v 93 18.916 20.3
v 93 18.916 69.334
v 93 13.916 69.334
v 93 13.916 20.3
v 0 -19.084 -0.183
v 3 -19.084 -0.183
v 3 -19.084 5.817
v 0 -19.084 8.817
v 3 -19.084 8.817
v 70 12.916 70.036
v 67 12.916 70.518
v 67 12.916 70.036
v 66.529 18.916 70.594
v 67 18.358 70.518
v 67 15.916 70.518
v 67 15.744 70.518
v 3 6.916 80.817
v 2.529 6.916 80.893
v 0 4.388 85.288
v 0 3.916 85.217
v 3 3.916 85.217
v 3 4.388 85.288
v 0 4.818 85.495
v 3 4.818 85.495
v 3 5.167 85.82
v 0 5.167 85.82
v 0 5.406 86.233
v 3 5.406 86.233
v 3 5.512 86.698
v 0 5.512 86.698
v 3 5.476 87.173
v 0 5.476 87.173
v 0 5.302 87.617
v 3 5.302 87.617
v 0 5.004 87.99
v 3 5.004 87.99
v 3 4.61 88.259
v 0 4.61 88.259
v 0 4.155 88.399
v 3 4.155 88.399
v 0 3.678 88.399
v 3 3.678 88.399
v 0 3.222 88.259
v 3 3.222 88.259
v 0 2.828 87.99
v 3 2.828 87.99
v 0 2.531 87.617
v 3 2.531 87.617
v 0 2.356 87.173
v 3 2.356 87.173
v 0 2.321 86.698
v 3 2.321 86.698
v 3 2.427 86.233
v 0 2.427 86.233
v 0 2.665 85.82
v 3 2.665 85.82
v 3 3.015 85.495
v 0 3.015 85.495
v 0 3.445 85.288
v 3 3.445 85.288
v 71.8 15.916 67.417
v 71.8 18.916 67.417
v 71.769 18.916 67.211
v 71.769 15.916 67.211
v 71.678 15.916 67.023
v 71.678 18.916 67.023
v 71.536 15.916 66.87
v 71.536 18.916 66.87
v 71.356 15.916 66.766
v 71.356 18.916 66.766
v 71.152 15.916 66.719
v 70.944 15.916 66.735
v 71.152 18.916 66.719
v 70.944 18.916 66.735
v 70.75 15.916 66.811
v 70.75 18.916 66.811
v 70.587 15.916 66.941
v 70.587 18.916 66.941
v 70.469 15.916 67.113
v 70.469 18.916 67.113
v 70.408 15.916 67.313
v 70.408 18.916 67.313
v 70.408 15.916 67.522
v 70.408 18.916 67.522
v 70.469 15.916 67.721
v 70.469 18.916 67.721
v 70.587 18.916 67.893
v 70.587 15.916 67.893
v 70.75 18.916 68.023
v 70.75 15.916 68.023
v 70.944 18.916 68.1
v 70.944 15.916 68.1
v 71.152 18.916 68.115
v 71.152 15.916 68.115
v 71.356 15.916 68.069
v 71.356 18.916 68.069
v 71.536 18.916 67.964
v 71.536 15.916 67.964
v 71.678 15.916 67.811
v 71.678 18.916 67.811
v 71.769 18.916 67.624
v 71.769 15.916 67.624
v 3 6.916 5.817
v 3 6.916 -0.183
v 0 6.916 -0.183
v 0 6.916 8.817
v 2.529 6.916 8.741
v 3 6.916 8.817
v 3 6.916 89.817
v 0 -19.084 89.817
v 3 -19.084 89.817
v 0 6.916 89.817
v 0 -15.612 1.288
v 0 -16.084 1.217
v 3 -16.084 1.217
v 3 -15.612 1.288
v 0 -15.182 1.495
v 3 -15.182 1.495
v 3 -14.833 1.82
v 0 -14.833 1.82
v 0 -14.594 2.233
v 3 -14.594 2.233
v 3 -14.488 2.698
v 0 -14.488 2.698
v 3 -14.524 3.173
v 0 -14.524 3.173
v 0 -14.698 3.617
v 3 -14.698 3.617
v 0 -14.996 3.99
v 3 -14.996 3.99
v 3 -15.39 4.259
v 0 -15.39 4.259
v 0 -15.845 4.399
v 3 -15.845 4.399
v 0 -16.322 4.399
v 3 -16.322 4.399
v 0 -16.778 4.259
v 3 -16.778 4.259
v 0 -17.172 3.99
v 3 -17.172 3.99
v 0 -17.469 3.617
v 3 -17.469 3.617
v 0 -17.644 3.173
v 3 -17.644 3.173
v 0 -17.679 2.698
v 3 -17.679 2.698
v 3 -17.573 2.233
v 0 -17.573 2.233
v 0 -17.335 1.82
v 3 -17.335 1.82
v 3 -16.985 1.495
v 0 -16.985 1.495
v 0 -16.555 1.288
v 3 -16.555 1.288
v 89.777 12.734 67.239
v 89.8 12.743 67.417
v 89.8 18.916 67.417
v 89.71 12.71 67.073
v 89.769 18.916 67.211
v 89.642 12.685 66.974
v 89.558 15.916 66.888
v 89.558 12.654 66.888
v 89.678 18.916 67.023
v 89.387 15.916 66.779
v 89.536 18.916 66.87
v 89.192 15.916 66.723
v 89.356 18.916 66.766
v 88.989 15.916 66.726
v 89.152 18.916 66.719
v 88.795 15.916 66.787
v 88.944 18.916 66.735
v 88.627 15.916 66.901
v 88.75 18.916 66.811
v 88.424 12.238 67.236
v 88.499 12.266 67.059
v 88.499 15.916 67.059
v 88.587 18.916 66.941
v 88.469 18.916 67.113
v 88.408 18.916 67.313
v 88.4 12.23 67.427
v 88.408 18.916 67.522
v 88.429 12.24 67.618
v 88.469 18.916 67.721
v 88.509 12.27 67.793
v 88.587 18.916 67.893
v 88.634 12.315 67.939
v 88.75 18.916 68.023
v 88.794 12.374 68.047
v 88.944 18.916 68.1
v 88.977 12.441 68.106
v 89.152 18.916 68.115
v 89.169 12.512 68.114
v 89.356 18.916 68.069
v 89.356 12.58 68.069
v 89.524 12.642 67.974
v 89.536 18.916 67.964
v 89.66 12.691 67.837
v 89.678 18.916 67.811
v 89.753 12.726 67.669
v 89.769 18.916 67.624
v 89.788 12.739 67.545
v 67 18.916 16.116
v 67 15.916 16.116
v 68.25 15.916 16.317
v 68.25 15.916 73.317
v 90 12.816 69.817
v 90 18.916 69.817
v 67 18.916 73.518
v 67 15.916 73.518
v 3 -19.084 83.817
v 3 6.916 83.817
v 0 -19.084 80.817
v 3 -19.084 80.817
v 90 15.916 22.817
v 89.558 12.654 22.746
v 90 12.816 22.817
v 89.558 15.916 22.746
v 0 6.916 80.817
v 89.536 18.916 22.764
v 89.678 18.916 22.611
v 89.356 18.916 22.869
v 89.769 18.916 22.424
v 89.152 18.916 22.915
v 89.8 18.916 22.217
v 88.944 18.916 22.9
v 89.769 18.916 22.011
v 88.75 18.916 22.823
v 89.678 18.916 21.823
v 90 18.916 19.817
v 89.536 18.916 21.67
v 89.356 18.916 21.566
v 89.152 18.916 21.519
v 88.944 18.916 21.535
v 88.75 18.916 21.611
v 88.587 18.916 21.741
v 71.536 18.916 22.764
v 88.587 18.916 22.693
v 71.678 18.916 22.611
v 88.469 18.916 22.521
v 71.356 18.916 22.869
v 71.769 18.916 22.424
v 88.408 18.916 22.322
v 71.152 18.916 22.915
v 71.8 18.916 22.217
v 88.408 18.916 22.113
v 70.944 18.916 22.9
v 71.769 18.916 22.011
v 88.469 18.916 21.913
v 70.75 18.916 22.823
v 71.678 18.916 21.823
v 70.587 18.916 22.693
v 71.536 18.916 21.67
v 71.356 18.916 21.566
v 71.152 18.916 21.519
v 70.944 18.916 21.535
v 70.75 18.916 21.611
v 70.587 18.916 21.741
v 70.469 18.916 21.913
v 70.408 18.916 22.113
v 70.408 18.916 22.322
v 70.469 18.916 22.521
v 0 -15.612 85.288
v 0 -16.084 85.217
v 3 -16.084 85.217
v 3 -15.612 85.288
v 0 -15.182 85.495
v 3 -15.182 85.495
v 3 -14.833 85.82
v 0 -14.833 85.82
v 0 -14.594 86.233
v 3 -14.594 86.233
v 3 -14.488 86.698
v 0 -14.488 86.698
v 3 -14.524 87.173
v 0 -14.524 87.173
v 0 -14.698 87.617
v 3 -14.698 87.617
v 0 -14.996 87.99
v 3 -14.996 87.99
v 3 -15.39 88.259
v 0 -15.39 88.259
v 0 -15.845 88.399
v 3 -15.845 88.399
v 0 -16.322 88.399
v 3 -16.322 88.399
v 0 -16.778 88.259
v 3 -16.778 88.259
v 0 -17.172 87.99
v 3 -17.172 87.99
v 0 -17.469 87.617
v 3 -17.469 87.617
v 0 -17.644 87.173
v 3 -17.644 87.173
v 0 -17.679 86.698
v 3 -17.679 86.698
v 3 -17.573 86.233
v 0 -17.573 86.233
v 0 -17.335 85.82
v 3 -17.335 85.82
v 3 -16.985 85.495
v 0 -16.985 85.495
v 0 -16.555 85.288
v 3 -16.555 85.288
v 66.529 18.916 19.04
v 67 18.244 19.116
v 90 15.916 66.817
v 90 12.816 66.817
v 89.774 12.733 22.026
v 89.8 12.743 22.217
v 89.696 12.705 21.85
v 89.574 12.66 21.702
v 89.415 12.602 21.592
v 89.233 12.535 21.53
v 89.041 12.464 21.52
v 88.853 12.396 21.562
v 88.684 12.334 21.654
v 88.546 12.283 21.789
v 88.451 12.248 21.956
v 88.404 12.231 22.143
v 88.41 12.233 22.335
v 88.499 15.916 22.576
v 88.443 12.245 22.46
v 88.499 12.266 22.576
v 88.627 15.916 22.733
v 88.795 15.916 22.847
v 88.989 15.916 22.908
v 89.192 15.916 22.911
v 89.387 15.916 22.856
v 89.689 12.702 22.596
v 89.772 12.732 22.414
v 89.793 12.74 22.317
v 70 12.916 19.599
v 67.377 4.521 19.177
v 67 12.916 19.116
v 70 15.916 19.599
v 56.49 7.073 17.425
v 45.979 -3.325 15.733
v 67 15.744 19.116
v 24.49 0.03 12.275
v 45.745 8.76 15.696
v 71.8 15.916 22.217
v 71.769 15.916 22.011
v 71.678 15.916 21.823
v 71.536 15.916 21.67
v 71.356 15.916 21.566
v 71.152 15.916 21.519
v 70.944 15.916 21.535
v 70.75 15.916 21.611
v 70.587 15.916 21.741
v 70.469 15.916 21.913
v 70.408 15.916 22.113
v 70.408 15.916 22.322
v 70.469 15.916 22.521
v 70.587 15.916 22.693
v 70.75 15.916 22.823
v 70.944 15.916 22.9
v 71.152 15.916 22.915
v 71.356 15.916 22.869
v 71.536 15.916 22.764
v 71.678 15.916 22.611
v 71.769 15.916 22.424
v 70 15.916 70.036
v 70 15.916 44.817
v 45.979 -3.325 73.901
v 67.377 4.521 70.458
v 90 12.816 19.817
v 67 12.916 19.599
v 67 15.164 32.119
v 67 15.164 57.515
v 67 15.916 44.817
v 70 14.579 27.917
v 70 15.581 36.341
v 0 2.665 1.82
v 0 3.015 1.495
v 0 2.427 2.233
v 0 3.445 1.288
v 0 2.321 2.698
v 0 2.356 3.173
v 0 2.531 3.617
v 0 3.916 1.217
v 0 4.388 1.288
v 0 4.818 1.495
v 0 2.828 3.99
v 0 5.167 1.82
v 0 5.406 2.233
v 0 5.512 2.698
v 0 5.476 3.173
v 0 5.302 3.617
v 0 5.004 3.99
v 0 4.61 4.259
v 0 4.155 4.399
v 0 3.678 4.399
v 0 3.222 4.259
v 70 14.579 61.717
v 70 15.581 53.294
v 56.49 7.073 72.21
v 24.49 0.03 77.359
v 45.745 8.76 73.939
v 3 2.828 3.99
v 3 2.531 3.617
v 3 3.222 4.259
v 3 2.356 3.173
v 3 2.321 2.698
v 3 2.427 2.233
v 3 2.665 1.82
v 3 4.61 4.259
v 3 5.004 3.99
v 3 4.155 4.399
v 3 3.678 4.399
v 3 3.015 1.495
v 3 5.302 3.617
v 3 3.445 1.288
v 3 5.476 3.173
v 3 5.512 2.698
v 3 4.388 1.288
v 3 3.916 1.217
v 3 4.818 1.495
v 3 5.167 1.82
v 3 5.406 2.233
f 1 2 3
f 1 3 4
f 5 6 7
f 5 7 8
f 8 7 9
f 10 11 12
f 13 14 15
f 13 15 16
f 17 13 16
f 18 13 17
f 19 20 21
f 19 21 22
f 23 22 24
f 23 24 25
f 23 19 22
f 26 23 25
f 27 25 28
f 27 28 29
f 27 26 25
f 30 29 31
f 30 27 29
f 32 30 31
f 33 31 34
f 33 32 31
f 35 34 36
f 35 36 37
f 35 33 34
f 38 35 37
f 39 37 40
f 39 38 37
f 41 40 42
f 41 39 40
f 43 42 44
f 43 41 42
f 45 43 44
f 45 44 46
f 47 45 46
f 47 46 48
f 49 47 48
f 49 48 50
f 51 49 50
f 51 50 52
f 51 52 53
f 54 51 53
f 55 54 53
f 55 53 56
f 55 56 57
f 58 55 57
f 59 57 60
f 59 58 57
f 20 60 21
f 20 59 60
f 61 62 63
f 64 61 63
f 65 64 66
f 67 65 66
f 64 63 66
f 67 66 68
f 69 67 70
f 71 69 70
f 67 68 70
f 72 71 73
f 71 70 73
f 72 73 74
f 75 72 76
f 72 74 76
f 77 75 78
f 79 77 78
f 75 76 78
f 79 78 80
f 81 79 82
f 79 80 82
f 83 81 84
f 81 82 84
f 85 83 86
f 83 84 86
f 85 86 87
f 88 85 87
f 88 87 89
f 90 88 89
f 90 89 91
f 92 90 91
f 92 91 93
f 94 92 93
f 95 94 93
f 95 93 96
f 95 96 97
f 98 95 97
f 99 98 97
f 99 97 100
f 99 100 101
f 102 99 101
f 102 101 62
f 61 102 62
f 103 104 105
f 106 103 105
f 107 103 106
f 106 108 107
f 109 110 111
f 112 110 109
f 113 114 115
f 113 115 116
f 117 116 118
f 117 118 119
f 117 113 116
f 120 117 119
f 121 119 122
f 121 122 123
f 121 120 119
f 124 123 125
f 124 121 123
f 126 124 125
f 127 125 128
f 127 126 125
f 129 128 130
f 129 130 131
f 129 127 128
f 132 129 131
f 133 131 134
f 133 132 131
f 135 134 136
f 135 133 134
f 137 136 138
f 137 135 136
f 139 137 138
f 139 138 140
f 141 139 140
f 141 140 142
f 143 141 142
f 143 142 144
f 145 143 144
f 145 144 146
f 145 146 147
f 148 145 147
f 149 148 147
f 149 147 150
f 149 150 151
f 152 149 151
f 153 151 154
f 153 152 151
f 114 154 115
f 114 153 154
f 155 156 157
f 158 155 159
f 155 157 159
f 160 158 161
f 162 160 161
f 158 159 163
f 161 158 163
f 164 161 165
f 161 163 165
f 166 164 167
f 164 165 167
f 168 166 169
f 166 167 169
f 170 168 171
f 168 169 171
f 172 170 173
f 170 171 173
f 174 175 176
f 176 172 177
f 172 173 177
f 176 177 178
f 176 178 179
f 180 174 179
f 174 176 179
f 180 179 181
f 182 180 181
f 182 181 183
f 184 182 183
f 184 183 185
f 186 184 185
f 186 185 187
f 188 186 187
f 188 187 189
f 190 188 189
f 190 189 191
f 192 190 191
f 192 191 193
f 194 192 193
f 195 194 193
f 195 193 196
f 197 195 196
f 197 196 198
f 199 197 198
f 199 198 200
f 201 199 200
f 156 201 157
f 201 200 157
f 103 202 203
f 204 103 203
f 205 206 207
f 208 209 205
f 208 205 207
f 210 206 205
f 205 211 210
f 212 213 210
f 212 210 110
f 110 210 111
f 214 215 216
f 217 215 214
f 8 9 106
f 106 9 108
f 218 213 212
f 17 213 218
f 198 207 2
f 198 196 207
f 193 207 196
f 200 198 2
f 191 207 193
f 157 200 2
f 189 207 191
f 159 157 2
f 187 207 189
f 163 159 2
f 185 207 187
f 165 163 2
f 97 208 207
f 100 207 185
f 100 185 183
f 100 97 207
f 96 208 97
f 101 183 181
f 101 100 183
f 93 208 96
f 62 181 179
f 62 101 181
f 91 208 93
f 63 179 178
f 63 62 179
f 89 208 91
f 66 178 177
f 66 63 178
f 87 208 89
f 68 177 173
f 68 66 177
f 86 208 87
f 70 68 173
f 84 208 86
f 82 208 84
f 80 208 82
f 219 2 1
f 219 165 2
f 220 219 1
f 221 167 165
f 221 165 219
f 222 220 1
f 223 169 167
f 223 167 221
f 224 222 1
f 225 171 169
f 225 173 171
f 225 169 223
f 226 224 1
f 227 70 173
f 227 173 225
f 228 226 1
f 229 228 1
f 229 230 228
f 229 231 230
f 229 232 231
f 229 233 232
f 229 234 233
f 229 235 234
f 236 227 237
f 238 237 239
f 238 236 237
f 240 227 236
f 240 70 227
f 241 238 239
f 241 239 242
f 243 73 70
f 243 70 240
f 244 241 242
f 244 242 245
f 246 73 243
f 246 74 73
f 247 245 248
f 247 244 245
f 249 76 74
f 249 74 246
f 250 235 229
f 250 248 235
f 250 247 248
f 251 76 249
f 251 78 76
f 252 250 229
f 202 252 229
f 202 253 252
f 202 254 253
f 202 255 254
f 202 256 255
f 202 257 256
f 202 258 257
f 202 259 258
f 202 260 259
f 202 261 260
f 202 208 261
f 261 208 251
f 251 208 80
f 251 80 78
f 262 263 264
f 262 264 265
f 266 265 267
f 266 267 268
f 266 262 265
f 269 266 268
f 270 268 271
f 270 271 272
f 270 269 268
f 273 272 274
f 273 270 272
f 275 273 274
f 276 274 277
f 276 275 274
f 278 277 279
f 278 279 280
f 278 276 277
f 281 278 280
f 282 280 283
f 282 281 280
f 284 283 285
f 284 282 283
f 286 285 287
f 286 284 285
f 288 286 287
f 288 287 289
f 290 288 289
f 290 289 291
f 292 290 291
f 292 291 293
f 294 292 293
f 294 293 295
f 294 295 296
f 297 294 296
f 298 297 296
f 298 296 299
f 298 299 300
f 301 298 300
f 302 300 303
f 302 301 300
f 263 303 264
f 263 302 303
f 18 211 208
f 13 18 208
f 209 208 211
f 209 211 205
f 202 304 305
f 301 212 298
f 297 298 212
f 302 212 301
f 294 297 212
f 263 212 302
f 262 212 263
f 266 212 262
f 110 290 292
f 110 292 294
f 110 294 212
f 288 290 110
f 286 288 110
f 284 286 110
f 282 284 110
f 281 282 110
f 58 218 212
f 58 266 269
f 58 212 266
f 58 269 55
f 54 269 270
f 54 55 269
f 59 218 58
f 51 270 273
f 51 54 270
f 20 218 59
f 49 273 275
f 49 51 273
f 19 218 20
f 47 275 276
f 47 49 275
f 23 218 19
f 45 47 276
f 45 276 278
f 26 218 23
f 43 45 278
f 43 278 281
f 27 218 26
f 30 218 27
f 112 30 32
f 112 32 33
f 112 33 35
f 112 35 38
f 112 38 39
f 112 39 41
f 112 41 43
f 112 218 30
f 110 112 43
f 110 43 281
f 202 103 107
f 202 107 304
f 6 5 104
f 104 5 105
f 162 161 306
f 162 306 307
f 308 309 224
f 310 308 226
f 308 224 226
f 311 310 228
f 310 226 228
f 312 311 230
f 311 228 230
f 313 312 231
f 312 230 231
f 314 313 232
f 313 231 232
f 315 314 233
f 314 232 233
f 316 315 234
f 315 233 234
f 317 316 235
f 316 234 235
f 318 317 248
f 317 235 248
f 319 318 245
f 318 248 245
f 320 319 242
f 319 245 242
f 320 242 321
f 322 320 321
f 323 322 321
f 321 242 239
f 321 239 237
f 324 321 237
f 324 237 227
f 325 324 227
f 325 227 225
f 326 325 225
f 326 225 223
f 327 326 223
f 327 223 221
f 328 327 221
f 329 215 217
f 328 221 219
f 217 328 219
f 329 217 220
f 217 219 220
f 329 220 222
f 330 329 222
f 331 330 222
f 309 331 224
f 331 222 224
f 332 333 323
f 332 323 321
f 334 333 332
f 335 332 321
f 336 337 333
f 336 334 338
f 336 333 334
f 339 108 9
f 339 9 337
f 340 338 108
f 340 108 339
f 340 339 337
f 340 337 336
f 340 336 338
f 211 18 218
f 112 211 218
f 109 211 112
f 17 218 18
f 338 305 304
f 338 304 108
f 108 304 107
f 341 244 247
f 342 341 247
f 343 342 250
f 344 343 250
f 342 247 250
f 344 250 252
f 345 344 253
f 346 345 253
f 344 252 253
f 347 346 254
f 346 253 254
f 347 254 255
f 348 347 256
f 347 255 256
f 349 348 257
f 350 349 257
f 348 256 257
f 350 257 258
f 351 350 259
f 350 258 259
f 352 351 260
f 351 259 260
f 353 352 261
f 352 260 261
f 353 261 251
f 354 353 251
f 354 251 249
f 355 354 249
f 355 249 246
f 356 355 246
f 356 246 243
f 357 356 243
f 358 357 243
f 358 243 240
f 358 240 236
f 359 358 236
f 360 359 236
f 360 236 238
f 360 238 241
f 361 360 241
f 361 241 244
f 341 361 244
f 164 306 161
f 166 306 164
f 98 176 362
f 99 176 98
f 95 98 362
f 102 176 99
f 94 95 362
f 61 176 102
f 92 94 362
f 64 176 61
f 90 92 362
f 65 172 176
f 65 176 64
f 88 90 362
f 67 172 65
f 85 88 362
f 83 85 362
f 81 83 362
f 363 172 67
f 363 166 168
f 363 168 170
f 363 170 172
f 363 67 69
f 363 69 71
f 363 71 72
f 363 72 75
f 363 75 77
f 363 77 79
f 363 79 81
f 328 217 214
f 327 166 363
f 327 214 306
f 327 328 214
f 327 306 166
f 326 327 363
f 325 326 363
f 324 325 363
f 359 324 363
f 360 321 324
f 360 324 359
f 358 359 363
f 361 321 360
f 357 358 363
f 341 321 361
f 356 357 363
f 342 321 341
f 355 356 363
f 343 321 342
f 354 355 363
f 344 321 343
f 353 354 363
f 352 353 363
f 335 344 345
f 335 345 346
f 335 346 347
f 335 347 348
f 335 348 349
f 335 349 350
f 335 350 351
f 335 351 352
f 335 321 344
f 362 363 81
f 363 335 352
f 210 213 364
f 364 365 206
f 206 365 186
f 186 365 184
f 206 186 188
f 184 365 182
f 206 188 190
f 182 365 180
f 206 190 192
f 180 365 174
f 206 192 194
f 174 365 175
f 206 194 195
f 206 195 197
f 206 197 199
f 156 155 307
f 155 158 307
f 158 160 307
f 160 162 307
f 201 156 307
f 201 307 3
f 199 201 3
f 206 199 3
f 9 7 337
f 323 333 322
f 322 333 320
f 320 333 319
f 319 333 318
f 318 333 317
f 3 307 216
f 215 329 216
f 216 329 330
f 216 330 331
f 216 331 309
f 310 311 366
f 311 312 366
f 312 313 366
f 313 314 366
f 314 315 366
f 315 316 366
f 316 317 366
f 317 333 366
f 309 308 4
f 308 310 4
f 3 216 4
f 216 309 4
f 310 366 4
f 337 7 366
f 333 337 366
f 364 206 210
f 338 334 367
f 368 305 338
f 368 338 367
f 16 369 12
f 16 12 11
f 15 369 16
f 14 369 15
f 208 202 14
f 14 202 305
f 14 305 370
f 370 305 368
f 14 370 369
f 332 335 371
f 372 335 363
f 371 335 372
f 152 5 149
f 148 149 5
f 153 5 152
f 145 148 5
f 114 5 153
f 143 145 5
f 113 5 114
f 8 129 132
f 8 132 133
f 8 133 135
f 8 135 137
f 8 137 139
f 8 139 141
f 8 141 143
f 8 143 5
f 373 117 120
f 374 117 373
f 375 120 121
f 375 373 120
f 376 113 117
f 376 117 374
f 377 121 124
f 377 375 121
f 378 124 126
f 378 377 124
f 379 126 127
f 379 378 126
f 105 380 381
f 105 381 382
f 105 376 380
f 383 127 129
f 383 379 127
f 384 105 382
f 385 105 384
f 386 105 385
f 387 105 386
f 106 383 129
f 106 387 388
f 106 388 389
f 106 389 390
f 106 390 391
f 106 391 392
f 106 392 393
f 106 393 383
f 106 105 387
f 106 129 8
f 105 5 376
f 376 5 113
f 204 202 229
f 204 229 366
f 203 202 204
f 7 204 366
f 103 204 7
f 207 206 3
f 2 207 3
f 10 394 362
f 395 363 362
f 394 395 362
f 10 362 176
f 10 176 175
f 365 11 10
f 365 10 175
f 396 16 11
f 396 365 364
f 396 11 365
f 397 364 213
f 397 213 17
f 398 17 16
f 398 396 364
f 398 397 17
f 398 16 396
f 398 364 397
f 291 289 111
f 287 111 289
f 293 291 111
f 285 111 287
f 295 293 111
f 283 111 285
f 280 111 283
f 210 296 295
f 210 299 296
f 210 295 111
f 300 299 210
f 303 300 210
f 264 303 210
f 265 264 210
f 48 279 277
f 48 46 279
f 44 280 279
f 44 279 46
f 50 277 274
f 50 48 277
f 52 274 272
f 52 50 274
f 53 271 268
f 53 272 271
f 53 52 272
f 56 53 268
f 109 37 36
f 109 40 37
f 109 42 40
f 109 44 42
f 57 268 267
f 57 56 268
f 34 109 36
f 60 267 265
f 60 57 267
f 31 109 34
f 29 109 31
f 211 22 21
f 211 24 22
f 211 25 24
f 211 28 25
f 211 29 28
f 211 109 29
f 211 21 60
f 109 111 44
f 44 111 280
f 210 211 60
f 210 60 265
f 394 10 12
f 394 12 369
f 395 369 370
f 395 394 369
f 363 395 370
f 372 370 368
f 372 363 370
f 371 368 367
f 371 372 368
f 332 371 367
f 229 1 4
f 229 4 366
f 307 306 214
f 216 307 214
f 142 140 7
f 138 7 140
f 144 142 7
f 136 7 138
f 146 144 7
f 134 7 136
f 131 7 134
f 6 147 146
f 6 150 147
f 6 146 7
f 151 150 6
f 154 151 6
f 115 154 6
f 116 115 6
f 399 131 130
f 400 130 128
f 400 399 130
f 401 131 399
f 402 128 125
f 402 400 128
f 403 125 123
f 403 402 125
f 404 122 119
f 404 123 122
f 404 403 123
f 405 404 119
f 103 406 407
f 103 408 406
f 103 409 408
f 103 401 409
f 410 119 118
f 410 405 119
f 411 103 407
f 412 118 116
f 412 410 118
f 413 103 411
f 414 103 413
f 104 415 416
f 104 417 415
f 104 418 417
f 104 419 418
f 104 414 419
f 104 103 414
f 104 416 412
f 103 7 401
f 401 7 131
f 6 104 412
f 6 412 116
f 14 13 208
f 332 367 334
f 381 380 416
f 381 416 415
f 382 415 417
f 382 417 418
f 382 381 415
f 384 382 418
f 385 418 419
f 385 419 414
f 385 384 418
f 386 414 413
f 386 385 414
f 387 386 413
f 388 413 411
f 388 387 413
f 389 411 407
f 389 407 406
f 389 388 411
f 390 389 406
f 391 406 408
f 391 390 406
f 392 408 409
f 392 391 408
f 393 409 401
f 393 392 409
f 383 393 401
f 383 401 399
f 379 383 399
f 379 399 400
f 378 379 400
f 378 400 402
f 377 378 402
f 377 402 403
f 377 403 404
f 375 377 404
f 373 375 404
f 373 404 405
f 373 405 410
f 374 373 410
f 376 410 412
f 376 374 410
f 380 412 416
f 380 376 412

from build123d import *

# Parameters (mm, degrees)
SKETCH_1_W          = 6
SKETCH_1_H          = 26
SKETCH_1_R          = 1.6
EXTRUDE_1_DEPTH     = 3
EXTRUDE_1_2_DEPTH   = 3
SKETCH_11_W         = 3
SKETCH_11_H         = 10
SKETCH_10_W         = 3
SKETCH_10_H         = 26
SKETCH_13_W         = 3
SKETCH_13_H         = 10
SKETCH_12_W         = 3
SKETCH_12_H         = 26
SKETCH_14_W         = 50
SKETCH_14_H         = 10
EXTRUDE_4_DEPTH     = 3
SKETCH_15_W         = 19.024799208
SKETCH_15_H         = 22.305451654
CUT_EXTRUDE_2_DEPTH = 3
SKETCH_16_W         = 14.351226191
SKETCH_16_H         = 17.437681629
CUT_EXTRUDE_3_DEPTH = 3
SKETCH_17_W         = 3
SKETCH_17_H         = 26
EXTRUDE_5_DEPTH     = 3
EXTRUDE_6_DEPTH     = 3
EXTRUDE_10_DEPTH    = 2.961896
EXTRUDE_11_DEPTH    = 2.961896
CUT_EXTRUDE_4_DEPTH = 100
SKETCH_22_W         = 3
SKETCH_22_H         = 51.402298851
EXTRUDE_12_DEPTH    = 3
CUT_EXTRUDE_5_DEPTH = 3
SKETCH_24_R         = 0.7
CUT_EXTRUDE_6_DEPTH = 10


with BuildPart() as part:
    # 草图1 → 凸台-拉伸1 (new body)
    with BuildSketch(Plane(origin=(0, 0, 0), x_dir=(0, 0, -1), z_dir=(1, 0, 0))):
        with Locations((-2.817174515, -6.083780501)):
            Rectangle(SKETCH_1_W, SKETCH_1_H)
        with Locations((-2.817174515, -16.083780501)):
            Circle(SKETCH_1_R, mode=Mode.SUBTRACT)
        with Locations((-2.817174515, 3.916219499)):
            Circle(SKETCH_1_R, mode=Mode.SUBTRACT)
    extrude(amount=EXTRUDE_1_DEPTH)



with BuildPart() as body_2:
    # 草图1 → Extrude 1 2 (new body)
    with BuildSketch(Plane(origin=(0, 0, 0), x_dir=(0, 0, -1), z_dir=(1, 0, 0))):
        with Locations((-86.817174515, -6.083780501)):
            Rectangle(SKETCH_1_W, SKETCH_1_H)
        with Locations((-86.817174515, -16.083780501)):
            Circle(SKETCH_1_R, mode=Mode.SUBTRACT)
        with Locations((-86.817174515, 3.916219499)):
            Circle(SKETCH_1_R, mode=Mode.SUBTRACT)
    extrude(amount=EXTRUDE_1_2_DEPTH)


with BuildPart() as body_3:
    # 草图11 → 放样4 section 0
    with BuildSketch(Plane.ZY.offset(-90)):
        with Locations((21.317174515, 13.916219499)):
            Rectangle(SKETCH_11_W, SKETCH_11_H)
    # 草图10 → 放样4 section 1
    with BuildSketch(Plane(origin=(3, 0, 0), x_dir=(0, 0, -1), z_dir=(1, 0, 0))):
        with Locations((-7.317174515, -6.083780501)):
            Rectangle(SKETCH_10_W, SKETCH_10_H)
    loft()



with BuildPart() as body_4:
    # 草图13 → 放样5 section 0
    with BuildSketch(Plane.ZY.offset(-90)):
        with Locations((68.317174515, 13.916219499)):
            Rectangle(SKETCH_13_W, SKETCH_13_H)
    # 草图12 → 放样5 section 1
    with BuildSketch(Plane(origin=(3, 0, 0), x_dir=(0, 0, -1), z_dir=(1, 0, 0))):
        with Locations((-82.317174515, -6.083780501)):
            Rectangle(SKETCH_12_W, SKETCH_12_H)
    loft()


with BuildPart() as body_3_1:
    add(body_3.part)

    add(body_4.part)  # 凸台-拉伸4 merges body 4
    # 草图14 → 凸台-拉伸4 (add)
    with BuildSketch(Plane(origin=(90, 0, 0), x_dir=(0, 0, -1), z_dir=(1, 0, 0))):
        with Locations((-44.817174515, 13.916219499)):
            Rectangle(SKETCH_14_W, SKETCH_14_H)
    extrude(amount=EXTRUDE_4_DEPTH)

    # 草图15 → 切除-拉伸2 (cut)
    with BuildSketch(Plane(origin=(13.223093182, 0, 82.172079061), x_dir=(0.987298603, 0, -0.158875637), z_dir=(0.158875637, 0, 0.987298603))):
        with Locations((78.439469875, 13.430311671)):
            Rectangle(SKETCH_15_W, SKETCH_15_H)
    extrude(amount=CUT_EXTRUDE_2_DEPTH, mode=Mode.SUBTRACT)

    # 草图16 → 切除-拉伸3 (cut)
    with BuildSketch(Plane(origin=(-0.83674418, 0, 5.199767406), x_dir=(-0.987298603, 0, -0.158875637), z_dir=(0.158875637, 0, -0.987298603))):
        with Locations((-93.553254701, 14.072952005)):
            Rectangle(SKETCH_16_W, SKETCH_16_H)
    extrude(amount=CUT_EXTRUDE_3_DEPTH, mode=Mode.SUBTRACT)


with BuildPart() as part_1:
    add(part.part)

    add(body_2.part)  # 凸台-拉伸5 merges body 2

    add(body_3_1.part)  # 凸台-拉伸5 merges body 3
    # 草图17 → 凸台-拉伸5 (add)
    with BuildSketch(Plane.ZY.offset(-3)):
        with Locations((7.317174515, -6.083780501)):
            Rectangle(SKETCH_17_W, SKETCH_17_H)
        with Locations((82.317174515, -6.083780501)):
            Rectangle(SKETCH_17_W, SKETCH_17_H)
    extrude(amount=EXTRUDE_5_DEPTH)

    # 草图18 → 凸台-拉伸6 (add)
    with BuildSketch(Plane(origin=(0, 18.916219499, 0), x_dir=(1, 0, 0), z_dir=(0, 1, 0))):
        Polygon((93, -69.334415895), (67, -73.518323941), (67, -16.11602509), (93, -20.299933136), align=None)
    extrude(amount=-EXTRUDE_6_DEPTH)

    # 草图19 → 凸台-拉伸10 (add)
    with BuildSketch(Plane(origin=(13.223093182, 0, 82.172079061), x_dir=(0.987298603, 0, -0.158875637), z_dir=(0.158875637, 0, 0.987298603))):
        Polygon((-10.354611208, 6.916219499), (54.468735845, 18.916219499), (57.643062592, 15.200587801), (10.872988387, 4.084352126), align=None)
    extrude(amount=-EXTRUDE_10_DEPTH)

    # 草图20 → 凸台-拉伸11 (add)
    with BuildSketch(Plane(origin=(-0.83674418, 0, 5.199767406), x_dir=(-0.987298603, 0, -0.158875637), z_dir=(0.158875637, 0, -0.987298603))):
        Polygon((-3.886103118, 6.916219499), (-68.709450171, 18.916219499), (-71.52946793, 14.93833866), (-30.165426117, 5.801086138), align=None)
    extrude(amount=-EXTRUDE_11_DEPTH)

    # 草图21 → 切除-拉伸4 (cut)
    with BuildSketch(Plane(origin=(0, 0, -0.182825485), x_dir=(-1, 0, 0), z_dir=(0, 0, -1))):
        Polygon((-3, -19.083780501), (-93, 13.916219499), (-93, 8.916219499), align=None)
    extrude(amount=-CUT_EXTRUDE_4_DEPTH, mode=Mode.SUBTRACT)

    # 草图22 → 凸台-拉伸12 (add)
    with BuildSketch(Plane.XZ.offset(-15.916219499)):
        with Locations((68.5, 44.817174515)):
            Rectangle(SKETCH_22_W, SKETCH_22_H)
    extrude(amount=EXTRUDE_12_DEPTH)

    # 草图23 → 切除-拉伸5 (cut)
    with BuildSketch(Plane(origin=(70, 0, 0), x_dir=(0, 0, -1), z_dir=(1, 0, 0))):
        with BuildLine():
            Line((-19.598783711, 12.916219499), (-70.03556532, 12.916219499))
            ThreePointArc((-70.03556532, 12.916219499), (-44.817174515, 15.916219499), (-19.598783711, 12.916219499))
        make_face()
    extrude(amount=-CUT_EXTRUDE_5_DEPTH, mode=Mode.SUBTRACT)

    # 草图24 → 切除-拉伸6 (cut)
    with BuildSketch(Plane(origin=(0, 18.916219499, 0), x_dir=(1, 0, 0), z_dir=(0, 1, 0))):
        with Locations((89.1, -67.417174515)):
            Circle(SKETCH_24_R)
        with Locations((71.1, -67.417174515)):
            Circle(SKETCH_24_R)
        with Locations((71.1, -22.217174515)):
            Circle(SKETCH_24_R)
        with Locations((89.1, -22.217174515)):
            Circle(SKETCH_24_R)
    extrude(amount=-CUT_EXTRUDE_6_DEPTH, mode=Mode.SUBTRACT)


solid = part_1.part
